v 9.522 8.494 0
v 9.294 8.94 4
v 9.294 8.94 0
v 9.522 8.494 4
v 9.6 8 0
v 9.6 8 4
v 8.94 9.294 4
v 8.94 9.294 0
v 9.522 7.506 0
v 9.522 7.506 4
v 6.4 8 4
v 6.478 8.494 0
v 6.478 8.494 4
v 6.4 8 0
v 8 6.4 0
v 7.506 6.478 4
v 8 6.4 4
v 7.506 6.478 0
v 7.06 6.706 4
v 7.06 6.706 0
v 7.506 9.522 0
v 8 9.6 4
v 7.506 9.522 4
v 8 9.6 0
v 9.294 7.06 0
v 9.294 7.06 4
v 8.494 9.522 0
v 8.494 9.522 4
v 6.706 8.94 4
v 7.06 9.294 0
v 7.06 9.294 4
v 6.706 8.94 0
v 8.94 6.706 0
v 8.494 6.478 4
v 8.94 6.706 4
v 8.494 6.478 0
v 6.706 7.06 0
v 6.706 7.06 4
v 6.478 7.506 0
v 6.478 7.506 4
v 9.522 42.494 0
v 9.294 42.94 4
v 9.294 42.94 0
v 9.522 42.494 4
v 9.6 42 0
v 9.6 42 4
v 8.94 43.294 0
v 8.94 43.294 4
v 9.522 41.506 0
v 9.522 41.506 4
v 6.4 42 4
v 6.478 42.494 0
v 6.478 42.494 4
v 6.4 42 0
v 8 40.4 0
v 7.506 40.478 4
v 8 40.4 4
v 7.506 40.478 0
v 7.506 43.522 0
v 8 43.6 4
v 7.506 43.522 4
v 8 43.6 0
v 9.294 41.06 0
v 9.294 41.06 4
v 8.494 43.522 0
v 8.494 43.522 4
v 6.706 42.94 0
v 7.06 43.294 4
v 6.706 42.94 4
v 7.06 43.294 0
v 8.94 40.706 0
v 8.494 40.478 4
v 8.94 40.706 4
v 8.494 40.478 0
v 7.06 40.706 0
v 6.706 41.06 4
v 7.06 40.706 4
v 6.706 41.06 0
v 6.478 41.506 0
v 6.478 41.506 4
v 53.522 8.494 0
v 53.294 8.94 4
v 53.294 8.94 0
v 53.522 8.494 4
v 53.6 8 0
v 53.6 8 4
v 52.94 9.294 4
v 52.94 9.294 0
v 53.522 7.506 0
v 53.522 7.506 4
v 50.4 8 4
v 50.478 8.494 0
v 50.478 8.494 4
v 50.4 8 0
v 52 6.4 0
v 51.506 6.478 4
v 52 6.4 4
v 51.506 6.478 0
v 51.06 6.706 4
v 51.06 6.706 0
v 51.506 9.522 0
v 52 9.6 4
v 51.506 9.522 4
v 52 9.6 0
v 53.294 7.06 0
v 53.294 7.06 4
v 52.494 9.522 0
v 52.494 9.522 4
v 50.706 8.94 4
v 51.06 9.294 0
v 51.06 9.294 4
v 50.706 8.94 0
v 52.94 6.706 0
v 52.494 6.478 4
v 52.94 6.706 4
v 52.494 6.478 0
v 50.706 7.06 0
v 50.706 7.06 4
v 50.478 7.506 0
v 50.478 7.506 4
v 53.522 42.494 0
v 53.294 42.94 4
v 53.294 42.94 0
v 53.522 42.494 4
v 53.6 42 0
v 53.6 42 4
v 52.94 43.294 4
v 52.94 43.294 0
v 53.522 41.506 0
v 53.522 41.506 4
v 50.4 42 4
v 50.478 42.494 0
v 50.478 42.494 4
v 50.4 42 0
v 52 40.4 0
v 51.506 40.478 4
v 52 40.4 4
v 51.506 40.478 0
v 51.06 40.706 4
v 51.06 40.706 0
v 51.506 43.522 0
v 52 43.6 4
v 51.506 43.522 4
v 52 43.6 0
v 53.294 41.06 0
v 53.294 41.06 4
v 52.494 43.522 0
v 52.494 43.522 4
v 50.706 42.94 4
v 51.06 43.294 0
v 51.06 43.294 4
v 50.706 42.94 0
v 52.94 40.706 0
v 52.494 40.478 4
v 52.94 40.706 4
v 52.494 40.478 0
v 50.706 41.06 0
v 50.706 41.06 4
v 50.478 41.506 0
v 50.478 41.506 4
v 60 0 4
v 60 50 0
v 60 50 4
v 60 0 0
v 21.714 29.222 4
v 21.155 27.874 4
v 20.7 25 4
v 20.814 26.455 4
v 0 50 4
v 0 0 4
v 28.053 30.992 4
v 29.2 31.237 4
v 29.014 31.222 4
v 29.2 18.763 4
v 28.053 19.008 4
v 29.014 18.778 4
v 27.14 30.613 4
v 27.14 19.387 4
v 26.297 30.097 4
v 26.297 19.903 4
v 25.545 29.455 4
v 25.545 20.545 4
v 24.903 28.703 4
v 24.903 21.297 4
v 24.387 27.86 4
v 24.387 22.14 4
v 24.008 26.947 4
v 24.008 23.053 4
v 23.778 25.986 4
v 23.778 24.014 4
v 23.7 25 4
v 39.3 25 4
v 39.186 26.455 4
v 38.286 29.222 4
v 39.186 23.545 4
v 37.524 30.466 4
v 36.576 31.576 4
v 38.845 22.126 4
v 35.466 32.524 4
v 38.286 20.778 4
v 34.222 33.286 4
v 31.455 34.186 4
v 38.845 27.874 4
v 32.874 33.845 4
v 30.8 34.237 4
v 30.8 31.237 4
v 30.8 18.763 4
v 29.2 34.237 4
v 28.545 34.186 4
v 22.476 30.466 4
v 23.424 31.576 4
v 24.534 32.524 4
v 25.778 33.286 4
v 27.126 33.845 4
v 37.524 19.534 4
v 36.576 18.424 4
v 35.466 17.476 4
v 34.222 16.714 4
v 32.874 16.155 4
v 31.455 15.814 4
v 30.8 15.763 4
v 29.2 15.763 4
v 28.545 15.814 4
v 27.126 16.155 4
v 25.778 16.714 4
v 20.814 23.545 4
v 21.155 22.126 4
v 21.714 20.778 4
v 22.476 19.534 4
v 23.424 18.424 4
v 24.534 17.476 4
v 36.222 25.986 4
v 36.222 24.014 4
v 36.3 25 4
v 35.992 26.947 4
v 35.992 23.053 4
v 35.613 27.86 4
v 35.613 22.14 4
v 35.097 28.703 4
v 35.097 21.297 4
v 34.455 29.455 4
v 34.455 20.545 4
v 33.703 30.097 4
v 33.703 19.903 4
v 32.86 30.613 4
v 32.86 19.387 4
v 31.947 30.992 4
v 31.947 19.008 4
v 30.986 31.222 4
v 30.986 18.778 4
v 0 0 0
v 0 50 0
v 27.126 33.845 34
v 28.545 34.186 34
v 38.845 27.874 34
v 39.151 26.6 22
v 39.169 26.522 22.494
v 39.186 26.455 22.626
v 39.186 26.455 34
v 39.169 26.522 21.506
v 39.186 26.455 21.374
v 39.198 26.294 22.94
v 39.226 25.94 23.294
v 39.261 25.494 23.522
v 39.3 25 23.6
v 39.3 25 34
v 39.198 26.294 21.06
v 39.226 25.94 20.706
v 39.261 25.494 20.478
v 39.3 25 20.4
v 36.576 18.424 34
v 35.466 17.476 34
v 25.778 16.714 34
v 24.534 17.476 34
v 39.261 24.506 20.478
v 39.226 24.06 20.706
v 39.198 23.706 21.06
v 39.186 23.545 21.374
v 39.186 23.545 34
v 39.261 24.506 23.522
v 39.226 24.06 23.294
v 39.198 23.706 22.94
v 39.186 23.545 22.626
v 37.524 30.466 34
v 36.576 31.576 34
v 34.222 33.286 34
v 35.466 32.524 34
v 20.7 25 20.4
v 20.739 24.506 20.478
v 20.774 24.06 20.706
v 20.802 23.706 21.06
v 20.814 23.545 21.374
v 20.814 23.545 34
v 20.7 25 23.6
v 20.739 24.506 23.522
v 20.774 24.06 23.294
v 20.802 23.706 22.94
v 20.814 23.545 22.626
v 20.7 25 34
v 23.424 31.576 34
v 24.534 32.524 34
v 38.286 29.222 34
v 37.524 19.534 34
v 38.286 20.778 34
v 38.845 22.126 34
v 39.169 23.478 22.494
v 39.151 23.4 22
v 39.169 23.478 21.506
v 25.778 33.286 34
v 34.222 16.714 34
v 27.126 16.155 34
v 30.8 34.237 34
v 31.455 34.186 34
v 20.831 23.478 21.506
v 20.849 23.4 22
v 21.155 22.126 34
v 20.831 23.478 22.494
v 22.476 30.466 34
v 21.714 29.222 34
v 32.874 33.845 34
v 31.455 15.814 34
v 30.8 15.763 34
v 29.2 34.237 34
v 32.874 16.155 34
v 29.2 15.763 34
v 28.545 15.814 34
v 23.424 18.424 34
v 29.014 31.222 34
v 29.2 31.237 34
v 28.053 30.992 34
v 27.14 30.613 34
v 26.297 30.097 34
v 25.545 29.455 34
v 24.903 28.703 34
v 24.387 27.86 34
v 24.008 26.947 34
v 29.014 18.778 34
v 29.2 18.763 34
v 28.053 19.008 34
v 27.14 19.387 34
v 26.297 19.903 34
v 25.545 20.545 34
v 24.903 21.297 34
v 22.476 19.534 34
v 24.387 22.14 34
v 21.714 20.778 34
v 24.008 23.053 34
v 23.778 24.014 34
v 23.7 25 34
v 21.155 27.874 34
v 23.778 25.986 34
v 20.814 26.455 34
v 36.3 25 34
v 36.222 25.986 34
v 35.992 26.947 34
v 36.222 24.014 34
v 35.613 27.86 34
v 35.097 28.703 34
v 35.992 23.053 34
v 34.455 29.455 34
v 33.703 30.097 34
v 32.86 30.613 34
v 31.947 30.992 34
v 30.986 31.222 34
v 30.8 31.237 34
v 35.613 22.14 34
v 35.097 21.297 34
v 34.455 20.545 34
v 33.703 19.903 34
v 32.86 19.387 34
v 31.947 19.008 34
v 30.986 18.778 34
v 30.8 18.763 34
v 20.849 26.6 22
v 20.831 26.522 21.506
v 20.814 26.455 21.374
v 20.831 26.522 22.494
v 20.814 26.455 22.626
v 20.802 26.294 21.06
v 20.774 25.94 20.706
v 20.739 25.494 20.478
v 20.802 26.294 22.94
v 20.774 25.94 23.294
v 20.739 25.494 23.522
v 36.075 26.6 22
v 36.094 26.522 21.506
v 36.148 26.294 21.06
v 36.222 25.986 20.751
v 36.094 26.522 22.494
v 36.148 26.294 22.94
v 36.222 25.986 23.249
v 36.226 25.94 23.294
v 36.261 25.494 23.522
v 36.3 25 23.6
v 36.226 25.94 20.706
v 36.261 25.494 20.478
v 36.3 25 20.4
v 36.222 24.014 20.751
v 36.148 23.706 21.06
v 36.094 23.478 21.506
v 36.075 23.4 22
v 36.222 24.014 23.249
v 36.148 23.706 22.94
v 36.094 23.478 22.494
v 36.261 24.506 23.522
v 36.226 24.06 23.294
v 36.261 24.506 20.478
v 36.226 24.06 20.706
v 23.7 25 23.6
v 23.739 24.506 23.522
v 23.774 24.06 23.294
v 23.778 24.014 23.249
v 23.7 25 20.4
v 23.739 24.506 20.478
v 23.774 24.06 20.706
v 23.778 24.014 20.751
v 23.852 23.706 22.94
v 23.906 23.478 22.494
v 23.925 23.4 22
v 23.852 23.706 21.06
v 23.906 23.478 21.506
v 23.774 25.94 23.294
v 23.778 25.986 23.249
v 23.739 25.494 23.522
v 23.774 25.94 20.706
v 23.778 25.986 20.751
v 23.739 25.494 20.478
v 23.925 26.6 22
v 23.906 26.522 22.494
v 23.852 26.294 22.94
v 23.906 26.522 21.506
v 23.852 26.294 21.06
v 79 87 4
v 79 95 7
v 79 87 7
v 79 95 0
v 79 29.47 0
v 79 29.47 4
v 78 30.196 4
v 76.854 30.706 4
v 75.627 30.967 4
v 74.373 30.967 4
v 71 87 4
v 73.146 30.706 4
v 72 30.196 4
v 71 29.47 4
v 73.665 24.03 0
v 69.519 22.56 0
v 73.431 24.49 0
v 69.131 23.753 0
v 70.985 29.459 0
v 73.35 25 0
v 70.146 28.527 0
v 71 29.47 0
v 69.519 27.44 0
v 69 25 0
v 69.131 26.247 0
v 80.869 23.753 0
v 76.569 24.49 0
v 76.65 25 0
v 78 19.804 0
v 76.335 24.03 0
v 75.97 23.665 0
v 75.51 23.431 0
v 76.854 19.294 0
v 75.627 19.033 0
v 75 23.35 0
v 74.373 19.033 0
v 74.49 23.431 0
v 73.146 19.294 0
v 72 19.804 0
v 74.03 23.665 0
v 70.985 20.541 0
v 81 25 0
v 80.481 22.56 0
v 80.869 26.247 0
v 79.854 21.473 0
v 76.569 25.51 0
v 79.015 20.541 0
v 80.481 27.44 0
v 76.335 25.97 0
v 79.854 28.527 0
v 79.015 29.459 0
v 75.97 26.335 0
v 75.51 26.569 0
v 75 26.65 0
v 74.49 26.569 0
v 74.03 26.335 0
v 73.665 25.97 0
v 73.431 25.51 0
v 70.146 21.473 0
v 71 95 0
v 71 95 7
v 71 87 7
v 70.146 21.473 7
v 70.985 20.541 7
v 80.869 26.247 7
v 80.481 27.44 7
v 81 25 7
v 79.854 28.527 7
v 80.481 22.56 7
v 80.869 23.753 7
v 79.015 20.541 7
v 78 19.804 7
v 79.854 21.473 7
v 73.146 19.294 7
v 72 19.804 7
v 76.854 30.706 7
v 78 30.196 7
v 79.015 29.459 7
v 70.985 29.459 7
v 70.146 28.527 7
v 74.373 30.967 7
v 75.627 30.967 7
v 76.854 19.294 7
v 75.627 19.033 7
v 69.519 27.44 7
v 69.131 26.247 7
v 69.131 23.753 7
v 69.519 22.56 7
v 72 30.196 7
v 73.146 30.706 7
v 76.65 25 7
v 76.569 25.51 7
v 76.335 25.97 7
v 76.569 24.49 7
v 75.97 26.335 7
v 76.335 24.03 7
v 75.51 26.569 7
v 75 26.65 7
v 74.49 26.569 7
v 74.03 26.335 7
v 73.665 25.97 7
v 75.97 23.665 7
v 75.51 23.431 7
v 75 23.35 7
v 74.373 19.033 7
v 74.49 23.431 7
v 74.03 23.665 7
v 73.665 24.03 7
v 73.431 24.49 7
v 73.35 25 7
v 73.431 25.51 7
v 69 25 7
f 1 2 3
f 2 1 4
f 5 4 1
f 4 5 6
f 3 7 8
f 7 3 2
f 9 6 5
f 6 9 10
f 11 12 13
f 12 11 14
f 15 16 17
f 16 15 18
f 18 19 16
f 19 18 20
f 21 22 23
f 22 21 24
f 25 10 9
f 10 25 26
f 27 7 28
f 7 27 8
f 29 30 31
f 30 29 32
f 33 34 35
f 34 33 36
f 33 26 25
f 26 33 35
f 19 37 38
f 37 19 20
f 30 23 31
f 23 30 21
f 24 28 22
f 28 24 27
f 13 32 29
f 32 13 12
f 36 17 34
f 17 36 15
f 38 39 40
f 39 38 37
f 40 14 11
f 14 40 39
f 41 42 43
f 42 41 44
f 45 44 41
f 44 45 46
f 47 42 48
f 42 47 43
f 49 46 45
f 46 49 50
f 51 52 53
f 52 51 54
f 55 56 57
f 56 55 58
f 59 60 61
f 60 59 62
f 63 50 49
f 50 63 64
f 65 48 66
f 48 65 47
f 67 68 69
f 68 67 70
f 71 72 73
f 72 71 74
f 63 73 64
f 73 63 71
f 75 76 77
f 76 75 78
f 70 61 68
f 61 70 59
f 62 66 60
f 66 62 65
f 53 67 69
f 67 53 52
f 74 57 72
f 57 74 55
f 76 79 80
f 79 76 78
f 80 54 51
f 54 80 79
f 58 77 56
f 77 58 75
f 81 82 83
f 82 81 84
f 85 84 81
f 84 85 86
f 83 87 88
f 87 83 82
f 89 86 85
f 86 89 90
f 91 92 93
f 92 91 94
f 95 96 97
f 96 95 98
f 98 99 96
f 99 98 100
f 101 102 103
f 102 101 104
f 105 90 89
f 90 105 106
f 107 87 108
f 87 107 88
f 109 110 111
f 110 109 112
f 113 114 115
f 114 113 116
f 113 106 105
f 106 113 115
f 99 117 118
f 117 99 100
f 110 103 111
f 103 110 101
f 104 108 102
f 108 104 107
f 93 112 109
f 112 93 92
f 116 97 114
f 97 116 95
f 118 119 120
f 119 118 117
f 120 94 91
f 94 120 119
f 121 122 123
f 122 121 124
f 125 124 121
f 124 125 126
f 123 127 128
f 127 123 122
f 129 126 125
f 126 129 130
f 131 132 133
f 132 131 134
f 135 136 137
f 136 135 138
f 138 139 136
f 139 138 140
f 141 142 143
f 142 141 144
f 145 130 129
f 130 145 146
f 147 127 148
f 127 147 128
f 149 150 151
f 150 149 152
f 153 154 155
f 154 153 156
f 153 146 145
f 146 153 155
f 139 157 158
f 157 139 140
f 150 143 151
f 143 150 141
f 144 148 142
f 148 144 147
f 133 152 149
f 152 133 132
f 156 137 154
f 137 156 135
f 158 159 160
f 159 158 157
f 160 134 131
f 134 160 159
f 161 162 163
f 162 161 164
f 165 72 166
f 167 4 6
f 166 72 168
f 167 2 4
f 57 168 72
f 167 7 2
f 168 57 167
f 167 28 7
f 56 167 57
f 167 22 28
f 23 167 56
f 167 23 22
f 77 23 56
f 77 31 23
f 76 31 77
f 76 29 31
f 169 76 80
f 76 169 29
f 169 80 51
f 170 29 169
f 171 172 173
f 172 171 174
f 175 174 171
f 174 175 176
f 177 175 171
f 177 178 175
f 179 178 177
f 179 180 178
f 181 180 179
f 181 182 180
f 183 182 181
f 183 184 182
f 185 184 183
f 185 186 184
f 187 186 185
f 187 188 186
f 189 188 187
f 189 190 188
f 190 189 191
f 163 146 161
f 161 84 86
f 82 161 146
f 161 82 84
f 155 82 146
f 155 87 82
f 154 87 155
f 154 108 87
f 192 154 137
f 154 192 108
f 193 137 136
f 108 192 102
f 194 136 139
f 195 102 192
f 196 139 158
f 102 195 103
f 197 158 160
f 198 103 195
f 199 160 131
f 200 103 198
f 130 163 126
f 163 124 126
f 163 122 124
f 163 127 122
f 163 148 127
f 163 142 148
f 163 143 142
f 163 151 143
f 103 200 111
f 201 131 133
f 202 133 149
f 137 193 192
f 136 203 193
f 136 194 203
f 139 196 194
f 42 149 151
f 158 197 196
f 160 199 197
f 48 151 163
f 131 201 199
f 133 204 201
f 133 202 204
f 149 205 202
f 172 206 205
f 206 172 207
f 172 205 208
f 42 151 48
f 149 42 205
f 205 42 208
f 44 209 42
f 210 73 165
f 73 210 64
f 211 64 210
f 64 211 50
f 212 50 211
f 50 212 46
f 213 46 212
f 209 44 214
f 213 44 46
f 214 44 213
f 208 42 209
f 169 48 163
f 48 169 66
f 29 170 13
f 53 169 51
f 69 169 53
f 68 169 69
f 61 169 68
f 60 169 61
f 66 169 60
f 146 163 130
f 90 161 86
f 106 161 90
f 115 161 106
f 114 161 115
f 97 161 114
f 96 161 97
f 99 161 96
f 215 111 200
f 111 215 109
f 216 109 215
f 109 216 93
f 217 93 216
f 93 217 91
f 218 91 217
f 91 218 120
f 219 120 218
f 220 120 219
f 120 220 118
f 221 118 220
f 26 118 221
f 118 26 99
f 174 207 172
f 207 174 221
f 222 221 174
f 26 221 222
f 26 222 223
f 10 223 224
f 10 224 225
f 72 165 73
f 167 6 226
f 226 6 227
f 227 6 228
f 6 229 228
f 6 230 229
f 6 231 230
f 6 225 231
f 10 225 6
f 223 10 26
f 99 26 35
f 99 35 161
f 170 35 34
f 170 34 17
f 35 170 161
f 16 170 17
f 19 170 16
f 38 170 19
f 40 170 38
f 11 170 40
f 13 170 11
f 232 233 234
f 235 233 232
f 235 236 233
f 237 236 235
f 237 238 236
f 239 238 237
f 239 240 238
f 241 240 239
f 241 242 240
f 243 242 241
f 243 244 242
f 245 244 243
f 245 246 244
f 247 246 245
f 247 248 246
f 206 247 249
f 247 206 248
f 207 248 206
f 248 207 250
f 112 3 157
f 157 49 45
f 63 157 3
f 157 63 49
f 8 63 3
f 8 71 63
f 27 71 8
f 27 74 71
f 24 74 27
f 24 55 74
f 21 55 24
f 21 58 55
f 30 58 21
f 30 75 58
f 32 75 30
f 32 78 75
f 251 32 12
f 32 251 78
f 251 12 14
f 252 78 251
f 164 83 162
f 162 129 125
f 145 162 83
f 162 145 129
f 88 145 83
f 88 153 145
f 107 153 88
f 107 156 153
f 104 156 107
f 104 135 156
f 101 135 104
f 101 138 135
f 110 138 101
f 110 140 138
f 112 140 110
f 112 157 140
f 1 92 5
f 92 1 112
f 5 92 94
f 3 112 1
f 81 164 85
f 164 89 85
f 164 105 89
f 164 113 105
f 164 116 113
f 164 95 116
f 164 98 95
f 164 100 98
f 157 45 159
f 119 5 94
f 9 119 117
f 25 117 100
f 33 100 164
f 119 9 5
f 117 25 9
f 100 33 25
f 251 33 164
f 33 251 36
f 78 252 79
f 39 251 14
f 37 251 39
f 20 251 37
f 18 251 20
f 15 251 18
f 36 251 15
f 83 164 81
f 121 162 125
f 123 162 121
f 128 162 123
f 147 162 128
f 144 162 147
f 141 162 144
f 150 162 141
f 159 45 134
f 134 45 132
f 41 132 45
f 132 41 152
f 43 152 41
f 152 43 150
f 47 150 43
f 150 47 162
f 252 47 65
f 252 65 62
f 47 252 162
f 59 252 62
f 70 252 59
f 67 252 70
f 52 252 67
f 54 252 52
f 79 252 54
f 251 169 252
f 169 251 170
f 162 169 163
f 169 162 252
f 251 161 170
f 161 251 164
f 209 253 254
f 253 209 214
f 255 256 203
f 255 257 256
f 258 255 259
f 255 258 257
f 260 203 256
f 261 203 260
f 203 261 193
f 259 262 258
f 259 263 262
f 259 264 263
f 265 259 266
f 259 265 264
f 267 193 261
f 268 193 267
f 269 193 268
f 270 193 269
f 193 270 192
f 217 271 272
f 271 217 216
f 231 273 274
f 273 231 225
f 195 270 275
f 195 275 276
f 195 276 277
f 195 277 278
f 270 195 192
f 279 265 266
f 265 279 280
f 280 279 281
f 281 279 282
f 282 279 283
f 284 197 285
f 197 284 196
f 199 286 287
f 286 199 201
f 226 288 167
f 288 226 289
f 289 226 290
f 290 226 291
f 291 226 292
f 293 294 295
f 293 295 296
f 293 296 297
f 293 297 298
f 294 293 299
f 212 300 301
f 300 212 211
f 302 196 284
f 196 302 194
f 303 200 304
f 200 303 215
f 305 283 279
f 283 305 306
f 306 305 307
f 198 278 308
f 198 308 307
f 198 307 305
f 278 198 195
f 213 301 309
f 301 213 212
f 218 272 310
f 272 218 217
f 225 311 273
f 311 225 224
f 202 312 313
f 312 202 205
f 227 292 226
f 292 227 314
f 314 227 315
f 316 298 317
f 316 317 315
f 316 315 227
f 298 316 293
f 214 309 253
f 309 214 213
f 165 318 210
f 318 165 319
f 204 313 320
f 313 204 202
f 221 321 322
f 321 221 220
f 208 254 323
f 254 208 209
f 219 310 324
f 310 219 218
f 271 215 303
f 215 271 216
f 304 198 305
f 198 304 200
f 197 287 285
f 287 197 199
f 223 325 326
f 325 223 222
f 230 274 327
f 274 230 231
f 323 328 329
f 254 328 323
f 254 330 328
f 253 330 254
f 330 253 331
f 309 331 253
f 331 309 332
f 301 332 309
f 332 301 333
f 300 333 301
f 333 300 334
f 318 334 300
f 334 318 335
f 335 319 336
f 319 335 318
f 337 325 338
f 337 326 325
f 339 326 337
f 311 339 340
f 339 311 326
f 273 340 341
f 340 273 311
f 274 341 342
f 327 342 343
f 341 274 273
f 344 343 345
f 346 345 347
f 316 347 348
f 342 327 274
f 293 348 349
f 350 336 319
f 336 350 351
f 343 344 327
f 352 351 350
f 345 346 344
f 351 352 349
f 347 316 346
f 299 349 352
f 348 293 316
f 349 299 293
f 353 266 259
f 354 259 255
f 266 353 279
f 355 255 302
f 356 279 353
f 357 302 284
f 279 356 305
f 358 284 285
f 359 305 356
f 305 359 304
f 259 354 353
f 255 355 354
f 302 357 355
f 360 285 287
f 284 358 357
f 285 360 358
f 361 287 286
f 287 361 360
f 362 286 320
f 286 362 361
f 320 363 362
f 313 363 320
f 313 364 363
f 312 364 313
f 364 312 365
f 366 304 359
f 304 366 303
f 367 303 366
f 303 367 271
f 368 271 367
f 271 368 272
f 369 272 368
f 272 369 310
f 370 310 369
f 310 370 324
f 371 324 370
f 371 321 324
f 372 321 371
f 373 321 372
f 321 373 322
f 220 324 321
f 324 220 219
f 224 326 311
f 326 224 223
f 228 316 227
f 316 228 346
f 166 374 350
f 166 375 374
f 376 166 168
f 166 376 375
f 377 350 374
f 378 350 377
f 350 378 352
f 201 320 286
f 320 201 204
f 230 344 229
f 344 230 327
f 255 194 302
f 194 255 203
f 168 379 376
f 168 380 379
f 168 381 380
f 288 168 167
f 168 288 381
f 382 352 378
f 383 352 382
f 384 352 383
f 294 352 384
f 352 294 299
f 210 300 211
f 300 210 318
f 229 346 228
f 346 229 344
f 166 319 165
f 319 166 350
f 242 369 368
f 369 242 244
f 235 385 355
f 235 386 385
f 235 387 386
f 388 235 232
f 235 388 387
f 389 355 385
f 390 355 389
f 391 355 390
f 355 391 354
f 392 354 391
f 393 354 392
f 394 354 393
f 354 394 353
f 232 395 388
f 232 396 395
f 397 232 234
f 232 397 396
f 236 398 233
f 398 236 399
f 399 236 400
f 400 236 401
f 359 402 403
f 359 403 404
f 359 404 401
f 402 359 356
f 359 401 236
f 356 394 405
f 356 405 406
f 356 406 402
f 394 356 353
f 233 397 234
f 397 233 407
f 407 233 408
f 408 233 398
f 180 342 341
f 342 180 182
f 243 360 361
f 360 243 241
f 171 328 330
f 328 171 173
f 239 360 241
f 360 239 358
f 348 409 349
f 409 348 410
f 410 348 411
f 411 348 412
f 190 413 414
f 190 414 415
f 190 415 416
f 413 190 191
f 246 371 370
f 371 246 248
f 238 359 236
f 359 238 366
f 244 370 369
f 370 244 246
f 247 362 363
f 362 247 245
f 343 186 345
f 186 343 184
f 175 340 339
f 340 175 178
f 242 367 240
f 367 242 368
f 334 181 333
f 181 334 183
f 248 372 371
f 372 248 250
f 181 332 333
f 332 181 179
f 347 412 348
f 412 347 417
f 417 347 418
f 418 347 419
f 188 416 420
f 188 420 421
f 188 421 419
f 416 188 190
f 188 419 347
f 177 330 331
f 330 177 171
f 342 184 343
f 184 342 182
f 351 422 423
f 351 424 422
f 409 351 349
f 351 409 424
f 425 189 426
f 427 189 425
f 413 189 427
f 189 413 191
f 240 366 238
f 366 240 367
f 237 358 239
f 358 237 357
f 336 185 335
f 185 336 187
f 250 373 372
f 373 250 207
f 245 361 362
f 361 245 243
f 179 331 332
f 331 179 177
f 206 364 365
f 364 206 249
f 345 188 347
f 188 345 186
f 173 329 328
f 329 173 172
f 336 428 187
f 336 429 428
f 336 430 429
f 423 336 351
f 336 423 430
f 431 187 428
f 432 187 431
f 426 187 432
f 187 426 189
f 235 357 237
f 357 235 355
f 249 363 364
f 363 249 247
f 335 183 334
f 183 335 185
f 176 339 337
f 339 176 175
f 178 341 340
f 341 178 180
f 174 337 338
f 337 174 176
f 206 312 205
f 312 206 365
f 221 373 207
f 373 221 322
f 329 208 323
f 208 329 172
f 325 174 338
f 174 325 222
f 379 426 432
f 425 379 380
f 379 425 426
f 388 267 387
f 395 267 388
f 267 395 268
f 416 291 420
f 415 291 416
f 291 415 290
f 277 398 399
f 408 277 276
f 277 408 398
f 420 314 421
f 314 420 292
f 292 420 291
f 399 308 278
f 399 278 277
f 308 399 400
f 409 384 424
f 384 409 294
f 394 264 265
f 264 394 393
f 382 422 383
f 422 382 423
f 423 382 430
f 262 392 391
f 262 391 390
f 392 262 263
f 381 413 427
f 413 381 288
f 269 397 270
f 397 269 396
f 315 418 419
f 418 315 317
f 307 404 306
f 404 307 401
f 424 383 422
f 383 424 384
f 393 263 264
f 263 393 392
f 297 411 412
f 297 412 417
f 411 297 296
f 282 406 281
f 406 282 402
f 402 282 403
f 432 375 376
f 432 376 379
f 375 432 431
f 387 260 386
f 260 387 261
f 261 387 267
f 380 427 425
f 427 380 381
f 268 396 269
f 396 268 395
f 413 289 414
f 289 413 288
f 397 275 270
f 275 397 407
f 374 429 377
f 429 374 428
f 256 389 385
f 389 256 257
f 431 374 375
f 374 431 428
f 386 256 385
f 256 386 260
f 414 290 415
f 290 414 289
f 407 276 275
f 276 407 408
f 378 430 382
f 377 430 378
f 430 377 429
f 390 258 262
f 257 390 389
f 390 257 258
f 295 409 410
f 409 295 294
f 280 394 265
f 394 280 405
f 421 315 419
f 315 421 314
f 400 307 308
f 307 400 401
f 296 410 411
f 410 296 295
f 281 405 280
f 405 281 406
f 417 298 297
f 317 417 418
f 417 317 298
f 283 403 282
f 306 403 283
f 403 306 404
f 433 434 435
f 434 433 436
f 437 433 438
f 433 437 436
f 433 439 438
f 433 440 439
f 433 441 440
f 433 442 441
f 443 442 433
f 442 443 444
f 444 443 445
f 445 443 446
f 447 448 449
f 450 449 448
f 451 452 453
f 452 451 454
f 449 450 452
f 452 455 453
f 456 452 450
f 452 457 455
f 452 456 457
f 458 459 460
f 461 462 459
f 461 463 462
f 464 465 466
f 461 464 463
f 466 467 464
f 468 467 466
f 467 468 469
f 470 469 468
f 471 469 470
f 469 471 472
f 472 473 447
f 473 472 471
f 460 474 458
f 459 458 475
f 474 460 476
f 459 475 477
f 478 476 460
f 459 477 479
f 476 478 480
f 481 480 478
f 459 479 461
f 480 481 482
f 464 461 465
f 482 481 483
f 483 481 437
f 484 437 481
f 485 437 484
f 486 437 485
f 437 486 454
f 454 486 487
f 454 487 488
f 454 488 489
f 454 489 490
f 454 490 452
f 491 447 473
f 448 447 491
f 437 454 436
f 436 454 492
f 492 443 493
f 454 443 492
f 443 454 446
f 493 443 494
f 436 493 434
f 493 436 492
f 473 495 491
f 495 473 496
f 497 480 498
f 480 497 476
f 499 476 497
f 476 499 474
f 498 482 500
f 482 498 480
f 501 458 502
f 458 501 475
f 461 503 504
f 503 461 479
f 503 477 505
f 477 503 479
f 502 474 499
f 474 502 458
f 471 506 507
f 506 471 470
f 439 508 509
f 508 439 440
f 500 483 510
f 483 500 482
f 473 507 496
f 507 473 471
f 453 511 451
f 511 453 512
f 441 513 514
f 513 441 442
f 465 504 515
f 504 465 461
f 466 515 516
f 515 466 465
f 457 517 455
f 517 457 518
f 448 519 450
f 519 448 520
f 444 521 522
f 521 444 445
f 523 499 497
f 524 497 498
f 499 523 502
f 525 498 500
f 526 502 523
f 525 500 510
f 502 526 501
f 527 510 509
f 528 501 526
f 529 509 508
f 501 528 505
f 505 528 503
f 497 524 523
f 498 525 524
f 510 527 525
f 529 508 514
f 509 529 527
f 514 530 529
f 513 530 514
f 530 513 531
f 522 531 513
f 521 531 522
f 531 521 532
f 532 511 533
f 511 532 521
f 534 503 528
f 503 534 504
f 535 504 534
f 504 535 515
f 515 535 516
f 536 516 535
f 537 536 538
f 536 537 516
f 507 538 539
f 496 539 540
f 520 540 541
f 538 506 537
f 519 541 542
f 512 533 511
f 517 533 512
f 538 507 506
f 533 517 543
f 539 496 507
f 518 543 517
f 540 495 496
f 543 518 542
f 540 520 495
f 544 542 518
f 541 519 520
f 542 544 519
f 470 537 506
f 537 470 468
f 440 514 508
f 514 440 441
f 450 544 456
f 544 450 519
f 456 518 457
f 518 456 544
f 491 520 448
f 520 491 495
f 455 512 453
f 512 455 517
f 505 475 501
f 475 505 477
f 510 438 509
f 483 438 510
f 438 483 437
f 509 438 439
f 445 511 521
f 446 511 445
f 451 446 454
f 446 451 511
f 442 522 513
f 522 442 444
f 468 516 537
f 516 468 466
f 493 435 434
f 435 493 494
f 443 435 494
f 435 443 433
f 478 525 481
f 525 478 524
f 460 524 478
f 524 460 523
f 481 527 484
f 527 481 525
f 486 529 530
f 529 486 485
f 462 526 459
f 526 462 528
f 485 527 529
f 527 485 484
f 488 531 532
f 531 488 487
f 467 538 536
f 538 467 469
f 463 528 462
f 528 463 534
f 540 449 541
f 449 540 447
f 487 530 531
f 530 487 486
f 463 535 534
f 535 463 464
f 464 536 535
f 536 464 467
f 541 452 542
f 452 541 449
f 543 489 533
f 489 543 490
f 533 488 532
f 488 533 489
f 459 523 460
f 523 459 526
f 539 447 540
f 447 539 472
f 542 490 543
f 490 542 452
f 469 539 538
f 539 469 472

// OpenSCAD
// ============================================================
//  N20 Motor + Encoder Mount Bracket
//  For: CAN-Bus Joint Controller project
//
//  Dimensions to verify against your actual N20 motor:
//    - Motor body diameter: 12mm (standard N20)
//    - Motor body length:   ~15mm
//    - Encoder body:        extends ~15mm behind motor
//    - Output shaft:        1.5mm or 3mm diameter
//    - Mounting holes:      M3 screws
//
//  Parts produced:
//    1. Base plate  — mounts to table/stand via M3 screws
//    2. Motor clamp — holds N20 motor body rigidly
//    3. Lever arm   — attaches to output shaft, sweeps visibly
//
//  Print settings: 0.2mm layer, 40% infill, PETG or PLA
//  No supports needed if printed in orientation shown.
// ============================================================

// ── Tuneable parameters ──────────────────────────────────────
motor_diameter   = 12.0;   // N20 body diameter (mm) — measure yours
motor_length     = 15.0;   // N20 body length (mm)
encoder_length   = 15.0;   // encoder extension behind motor
clamp_wall       = 3.0;    // wall thickness around motor
base_thickness   = 4.0;    // base plate thickness
base_width       = 50.0;   // base plate width
base_length      = 60.0;   // base plate length
m3_hole          = 3.2;    // M3 screw clearance hole
lever_length     = 70.0;   // lever arm length (tip to shaft center)
lever_width      = 8.0;    // lever arm width
lever_thickness  = 4.0;    // lever arm thickness
shaft_diameter   = 3.0;    // output shaft diameter — check yours (1.5 or 3mm)
tolerance        = 0.3;    // 3D print fit tolerance

// ── Derived values ───────────────────────────────────────────
motor_r        = motor_diameter / 2 + tolerance;
clamp_outer_r  = motor_r + clamp_wall;
clamp_height   = motor_length + encoder_length;
clamp_center_z = base_thickness + clamp_outer_r;

// ── Base plate ───────────────────────────────────────────────
module base_plate() {
    difference() {
        // Solid base
        cube([base_length, base_width, base_thickness]);

        // M3 mounting holes — 4 corners, 5mm from edges
        for (x = [8, base_length - 8])
            for (y = [8, base_width - 8])
                translate([x, y, -0.1])
                    cylinder(h = base_thickness + 0.2, r = m3_hole / 2, $fn = 20);
    }
}

// ── Motor clamp ──────────────────────────────────────────────
// Cylindrical collar that grips the N20 motor body.
// Clamp gap on one side allows slight squeeze with an M3 screw.
module motor_clamp() {
    clamp_x = base_length / 2;
    clamp_y = base_width / 2;

    translate([clamp_x, clamp_y, base_thickness]) {
        difference() {
            // Outer collar
            cylinder(h = clamp_height, r = clamp_outer_r, $fn = 40);

            // Inner bore for motor body
            translate([0, 0, -0.1])
                cylinder(h = clamp_height + 0.2, r = motor_r, $fn = 40);

            // Clamp gap slot (allows collar to flex closed slightly)
            translate([-0.8, -clamp_outer_r - 0.1, -0.1])
                cube([1.6, clamp_outer_r * 2 + 0.2, clamp_height + 0.2]);

            // M3 clamp screw hole (horizontal, through the gap)
            translate([-clamp_outer_r - 0.1, 0, clamp_height * 0.6])
                rotate([0, 90, 0])
                    cylinder(h = clamp_outer_r * 2 + 0.2, r = m3_hole / 2, $fn = 20);
        }
    }
}

// ── Lever arm ────────────────────────────────────────────────
// Attaches to output shaft. Press-fit hole for the shaft.
// Visual indicator of commanded vs actual position during demo.
module lever_arm() {
    difference() {
        union() {
            // Main arm body
            translate([-lever_width / 2, 0, 0])
                cube([lever_width, lever_length, lever_thickness]);

            // Hub around shaft hole (reinforcement)
            cylinder(h = lever_thickness + 3, r = lever_width / 2 + 2, $fn = 30);

            // Tip indicator bump so you can see the arm end clearly on video
            translate([-lever_width / 2, lever_length - lever_width, 0])
                cube([lever_width, lever_width, lever_thickness + 3]);
        }

        // Shaft press-fit hole (center of hub)
        translate([0, 0, -0.1])
            cylinder(h = lever_thickness + 3 + 0.2, r = (shaft_diameter + tolerance) / 2, $fn = 20);

        // Optional M2 set-screw hole through the side of hub
        translate([lever_width + 2, 0, lever_thickness / 2 + 1.5])
            rotate([0, 90, 0])
                cylinder(h = lever_width + 4, r = 1.1, $fn = 16);
    }
}

// ── Assembly ─────────────────────────────────────────────────
// Print base_plate + motor_clamp as one piece (they share the same Z=0).
// Print lever_arm separately (flat on build plate).

// Main bracket (base + clamp together)
base_plate();
motor_clamp();

// Lever arm — printed flat, shown offset here for visibility
translate([base_length + 15, base_width / 2, 0])
    lever_arm();
